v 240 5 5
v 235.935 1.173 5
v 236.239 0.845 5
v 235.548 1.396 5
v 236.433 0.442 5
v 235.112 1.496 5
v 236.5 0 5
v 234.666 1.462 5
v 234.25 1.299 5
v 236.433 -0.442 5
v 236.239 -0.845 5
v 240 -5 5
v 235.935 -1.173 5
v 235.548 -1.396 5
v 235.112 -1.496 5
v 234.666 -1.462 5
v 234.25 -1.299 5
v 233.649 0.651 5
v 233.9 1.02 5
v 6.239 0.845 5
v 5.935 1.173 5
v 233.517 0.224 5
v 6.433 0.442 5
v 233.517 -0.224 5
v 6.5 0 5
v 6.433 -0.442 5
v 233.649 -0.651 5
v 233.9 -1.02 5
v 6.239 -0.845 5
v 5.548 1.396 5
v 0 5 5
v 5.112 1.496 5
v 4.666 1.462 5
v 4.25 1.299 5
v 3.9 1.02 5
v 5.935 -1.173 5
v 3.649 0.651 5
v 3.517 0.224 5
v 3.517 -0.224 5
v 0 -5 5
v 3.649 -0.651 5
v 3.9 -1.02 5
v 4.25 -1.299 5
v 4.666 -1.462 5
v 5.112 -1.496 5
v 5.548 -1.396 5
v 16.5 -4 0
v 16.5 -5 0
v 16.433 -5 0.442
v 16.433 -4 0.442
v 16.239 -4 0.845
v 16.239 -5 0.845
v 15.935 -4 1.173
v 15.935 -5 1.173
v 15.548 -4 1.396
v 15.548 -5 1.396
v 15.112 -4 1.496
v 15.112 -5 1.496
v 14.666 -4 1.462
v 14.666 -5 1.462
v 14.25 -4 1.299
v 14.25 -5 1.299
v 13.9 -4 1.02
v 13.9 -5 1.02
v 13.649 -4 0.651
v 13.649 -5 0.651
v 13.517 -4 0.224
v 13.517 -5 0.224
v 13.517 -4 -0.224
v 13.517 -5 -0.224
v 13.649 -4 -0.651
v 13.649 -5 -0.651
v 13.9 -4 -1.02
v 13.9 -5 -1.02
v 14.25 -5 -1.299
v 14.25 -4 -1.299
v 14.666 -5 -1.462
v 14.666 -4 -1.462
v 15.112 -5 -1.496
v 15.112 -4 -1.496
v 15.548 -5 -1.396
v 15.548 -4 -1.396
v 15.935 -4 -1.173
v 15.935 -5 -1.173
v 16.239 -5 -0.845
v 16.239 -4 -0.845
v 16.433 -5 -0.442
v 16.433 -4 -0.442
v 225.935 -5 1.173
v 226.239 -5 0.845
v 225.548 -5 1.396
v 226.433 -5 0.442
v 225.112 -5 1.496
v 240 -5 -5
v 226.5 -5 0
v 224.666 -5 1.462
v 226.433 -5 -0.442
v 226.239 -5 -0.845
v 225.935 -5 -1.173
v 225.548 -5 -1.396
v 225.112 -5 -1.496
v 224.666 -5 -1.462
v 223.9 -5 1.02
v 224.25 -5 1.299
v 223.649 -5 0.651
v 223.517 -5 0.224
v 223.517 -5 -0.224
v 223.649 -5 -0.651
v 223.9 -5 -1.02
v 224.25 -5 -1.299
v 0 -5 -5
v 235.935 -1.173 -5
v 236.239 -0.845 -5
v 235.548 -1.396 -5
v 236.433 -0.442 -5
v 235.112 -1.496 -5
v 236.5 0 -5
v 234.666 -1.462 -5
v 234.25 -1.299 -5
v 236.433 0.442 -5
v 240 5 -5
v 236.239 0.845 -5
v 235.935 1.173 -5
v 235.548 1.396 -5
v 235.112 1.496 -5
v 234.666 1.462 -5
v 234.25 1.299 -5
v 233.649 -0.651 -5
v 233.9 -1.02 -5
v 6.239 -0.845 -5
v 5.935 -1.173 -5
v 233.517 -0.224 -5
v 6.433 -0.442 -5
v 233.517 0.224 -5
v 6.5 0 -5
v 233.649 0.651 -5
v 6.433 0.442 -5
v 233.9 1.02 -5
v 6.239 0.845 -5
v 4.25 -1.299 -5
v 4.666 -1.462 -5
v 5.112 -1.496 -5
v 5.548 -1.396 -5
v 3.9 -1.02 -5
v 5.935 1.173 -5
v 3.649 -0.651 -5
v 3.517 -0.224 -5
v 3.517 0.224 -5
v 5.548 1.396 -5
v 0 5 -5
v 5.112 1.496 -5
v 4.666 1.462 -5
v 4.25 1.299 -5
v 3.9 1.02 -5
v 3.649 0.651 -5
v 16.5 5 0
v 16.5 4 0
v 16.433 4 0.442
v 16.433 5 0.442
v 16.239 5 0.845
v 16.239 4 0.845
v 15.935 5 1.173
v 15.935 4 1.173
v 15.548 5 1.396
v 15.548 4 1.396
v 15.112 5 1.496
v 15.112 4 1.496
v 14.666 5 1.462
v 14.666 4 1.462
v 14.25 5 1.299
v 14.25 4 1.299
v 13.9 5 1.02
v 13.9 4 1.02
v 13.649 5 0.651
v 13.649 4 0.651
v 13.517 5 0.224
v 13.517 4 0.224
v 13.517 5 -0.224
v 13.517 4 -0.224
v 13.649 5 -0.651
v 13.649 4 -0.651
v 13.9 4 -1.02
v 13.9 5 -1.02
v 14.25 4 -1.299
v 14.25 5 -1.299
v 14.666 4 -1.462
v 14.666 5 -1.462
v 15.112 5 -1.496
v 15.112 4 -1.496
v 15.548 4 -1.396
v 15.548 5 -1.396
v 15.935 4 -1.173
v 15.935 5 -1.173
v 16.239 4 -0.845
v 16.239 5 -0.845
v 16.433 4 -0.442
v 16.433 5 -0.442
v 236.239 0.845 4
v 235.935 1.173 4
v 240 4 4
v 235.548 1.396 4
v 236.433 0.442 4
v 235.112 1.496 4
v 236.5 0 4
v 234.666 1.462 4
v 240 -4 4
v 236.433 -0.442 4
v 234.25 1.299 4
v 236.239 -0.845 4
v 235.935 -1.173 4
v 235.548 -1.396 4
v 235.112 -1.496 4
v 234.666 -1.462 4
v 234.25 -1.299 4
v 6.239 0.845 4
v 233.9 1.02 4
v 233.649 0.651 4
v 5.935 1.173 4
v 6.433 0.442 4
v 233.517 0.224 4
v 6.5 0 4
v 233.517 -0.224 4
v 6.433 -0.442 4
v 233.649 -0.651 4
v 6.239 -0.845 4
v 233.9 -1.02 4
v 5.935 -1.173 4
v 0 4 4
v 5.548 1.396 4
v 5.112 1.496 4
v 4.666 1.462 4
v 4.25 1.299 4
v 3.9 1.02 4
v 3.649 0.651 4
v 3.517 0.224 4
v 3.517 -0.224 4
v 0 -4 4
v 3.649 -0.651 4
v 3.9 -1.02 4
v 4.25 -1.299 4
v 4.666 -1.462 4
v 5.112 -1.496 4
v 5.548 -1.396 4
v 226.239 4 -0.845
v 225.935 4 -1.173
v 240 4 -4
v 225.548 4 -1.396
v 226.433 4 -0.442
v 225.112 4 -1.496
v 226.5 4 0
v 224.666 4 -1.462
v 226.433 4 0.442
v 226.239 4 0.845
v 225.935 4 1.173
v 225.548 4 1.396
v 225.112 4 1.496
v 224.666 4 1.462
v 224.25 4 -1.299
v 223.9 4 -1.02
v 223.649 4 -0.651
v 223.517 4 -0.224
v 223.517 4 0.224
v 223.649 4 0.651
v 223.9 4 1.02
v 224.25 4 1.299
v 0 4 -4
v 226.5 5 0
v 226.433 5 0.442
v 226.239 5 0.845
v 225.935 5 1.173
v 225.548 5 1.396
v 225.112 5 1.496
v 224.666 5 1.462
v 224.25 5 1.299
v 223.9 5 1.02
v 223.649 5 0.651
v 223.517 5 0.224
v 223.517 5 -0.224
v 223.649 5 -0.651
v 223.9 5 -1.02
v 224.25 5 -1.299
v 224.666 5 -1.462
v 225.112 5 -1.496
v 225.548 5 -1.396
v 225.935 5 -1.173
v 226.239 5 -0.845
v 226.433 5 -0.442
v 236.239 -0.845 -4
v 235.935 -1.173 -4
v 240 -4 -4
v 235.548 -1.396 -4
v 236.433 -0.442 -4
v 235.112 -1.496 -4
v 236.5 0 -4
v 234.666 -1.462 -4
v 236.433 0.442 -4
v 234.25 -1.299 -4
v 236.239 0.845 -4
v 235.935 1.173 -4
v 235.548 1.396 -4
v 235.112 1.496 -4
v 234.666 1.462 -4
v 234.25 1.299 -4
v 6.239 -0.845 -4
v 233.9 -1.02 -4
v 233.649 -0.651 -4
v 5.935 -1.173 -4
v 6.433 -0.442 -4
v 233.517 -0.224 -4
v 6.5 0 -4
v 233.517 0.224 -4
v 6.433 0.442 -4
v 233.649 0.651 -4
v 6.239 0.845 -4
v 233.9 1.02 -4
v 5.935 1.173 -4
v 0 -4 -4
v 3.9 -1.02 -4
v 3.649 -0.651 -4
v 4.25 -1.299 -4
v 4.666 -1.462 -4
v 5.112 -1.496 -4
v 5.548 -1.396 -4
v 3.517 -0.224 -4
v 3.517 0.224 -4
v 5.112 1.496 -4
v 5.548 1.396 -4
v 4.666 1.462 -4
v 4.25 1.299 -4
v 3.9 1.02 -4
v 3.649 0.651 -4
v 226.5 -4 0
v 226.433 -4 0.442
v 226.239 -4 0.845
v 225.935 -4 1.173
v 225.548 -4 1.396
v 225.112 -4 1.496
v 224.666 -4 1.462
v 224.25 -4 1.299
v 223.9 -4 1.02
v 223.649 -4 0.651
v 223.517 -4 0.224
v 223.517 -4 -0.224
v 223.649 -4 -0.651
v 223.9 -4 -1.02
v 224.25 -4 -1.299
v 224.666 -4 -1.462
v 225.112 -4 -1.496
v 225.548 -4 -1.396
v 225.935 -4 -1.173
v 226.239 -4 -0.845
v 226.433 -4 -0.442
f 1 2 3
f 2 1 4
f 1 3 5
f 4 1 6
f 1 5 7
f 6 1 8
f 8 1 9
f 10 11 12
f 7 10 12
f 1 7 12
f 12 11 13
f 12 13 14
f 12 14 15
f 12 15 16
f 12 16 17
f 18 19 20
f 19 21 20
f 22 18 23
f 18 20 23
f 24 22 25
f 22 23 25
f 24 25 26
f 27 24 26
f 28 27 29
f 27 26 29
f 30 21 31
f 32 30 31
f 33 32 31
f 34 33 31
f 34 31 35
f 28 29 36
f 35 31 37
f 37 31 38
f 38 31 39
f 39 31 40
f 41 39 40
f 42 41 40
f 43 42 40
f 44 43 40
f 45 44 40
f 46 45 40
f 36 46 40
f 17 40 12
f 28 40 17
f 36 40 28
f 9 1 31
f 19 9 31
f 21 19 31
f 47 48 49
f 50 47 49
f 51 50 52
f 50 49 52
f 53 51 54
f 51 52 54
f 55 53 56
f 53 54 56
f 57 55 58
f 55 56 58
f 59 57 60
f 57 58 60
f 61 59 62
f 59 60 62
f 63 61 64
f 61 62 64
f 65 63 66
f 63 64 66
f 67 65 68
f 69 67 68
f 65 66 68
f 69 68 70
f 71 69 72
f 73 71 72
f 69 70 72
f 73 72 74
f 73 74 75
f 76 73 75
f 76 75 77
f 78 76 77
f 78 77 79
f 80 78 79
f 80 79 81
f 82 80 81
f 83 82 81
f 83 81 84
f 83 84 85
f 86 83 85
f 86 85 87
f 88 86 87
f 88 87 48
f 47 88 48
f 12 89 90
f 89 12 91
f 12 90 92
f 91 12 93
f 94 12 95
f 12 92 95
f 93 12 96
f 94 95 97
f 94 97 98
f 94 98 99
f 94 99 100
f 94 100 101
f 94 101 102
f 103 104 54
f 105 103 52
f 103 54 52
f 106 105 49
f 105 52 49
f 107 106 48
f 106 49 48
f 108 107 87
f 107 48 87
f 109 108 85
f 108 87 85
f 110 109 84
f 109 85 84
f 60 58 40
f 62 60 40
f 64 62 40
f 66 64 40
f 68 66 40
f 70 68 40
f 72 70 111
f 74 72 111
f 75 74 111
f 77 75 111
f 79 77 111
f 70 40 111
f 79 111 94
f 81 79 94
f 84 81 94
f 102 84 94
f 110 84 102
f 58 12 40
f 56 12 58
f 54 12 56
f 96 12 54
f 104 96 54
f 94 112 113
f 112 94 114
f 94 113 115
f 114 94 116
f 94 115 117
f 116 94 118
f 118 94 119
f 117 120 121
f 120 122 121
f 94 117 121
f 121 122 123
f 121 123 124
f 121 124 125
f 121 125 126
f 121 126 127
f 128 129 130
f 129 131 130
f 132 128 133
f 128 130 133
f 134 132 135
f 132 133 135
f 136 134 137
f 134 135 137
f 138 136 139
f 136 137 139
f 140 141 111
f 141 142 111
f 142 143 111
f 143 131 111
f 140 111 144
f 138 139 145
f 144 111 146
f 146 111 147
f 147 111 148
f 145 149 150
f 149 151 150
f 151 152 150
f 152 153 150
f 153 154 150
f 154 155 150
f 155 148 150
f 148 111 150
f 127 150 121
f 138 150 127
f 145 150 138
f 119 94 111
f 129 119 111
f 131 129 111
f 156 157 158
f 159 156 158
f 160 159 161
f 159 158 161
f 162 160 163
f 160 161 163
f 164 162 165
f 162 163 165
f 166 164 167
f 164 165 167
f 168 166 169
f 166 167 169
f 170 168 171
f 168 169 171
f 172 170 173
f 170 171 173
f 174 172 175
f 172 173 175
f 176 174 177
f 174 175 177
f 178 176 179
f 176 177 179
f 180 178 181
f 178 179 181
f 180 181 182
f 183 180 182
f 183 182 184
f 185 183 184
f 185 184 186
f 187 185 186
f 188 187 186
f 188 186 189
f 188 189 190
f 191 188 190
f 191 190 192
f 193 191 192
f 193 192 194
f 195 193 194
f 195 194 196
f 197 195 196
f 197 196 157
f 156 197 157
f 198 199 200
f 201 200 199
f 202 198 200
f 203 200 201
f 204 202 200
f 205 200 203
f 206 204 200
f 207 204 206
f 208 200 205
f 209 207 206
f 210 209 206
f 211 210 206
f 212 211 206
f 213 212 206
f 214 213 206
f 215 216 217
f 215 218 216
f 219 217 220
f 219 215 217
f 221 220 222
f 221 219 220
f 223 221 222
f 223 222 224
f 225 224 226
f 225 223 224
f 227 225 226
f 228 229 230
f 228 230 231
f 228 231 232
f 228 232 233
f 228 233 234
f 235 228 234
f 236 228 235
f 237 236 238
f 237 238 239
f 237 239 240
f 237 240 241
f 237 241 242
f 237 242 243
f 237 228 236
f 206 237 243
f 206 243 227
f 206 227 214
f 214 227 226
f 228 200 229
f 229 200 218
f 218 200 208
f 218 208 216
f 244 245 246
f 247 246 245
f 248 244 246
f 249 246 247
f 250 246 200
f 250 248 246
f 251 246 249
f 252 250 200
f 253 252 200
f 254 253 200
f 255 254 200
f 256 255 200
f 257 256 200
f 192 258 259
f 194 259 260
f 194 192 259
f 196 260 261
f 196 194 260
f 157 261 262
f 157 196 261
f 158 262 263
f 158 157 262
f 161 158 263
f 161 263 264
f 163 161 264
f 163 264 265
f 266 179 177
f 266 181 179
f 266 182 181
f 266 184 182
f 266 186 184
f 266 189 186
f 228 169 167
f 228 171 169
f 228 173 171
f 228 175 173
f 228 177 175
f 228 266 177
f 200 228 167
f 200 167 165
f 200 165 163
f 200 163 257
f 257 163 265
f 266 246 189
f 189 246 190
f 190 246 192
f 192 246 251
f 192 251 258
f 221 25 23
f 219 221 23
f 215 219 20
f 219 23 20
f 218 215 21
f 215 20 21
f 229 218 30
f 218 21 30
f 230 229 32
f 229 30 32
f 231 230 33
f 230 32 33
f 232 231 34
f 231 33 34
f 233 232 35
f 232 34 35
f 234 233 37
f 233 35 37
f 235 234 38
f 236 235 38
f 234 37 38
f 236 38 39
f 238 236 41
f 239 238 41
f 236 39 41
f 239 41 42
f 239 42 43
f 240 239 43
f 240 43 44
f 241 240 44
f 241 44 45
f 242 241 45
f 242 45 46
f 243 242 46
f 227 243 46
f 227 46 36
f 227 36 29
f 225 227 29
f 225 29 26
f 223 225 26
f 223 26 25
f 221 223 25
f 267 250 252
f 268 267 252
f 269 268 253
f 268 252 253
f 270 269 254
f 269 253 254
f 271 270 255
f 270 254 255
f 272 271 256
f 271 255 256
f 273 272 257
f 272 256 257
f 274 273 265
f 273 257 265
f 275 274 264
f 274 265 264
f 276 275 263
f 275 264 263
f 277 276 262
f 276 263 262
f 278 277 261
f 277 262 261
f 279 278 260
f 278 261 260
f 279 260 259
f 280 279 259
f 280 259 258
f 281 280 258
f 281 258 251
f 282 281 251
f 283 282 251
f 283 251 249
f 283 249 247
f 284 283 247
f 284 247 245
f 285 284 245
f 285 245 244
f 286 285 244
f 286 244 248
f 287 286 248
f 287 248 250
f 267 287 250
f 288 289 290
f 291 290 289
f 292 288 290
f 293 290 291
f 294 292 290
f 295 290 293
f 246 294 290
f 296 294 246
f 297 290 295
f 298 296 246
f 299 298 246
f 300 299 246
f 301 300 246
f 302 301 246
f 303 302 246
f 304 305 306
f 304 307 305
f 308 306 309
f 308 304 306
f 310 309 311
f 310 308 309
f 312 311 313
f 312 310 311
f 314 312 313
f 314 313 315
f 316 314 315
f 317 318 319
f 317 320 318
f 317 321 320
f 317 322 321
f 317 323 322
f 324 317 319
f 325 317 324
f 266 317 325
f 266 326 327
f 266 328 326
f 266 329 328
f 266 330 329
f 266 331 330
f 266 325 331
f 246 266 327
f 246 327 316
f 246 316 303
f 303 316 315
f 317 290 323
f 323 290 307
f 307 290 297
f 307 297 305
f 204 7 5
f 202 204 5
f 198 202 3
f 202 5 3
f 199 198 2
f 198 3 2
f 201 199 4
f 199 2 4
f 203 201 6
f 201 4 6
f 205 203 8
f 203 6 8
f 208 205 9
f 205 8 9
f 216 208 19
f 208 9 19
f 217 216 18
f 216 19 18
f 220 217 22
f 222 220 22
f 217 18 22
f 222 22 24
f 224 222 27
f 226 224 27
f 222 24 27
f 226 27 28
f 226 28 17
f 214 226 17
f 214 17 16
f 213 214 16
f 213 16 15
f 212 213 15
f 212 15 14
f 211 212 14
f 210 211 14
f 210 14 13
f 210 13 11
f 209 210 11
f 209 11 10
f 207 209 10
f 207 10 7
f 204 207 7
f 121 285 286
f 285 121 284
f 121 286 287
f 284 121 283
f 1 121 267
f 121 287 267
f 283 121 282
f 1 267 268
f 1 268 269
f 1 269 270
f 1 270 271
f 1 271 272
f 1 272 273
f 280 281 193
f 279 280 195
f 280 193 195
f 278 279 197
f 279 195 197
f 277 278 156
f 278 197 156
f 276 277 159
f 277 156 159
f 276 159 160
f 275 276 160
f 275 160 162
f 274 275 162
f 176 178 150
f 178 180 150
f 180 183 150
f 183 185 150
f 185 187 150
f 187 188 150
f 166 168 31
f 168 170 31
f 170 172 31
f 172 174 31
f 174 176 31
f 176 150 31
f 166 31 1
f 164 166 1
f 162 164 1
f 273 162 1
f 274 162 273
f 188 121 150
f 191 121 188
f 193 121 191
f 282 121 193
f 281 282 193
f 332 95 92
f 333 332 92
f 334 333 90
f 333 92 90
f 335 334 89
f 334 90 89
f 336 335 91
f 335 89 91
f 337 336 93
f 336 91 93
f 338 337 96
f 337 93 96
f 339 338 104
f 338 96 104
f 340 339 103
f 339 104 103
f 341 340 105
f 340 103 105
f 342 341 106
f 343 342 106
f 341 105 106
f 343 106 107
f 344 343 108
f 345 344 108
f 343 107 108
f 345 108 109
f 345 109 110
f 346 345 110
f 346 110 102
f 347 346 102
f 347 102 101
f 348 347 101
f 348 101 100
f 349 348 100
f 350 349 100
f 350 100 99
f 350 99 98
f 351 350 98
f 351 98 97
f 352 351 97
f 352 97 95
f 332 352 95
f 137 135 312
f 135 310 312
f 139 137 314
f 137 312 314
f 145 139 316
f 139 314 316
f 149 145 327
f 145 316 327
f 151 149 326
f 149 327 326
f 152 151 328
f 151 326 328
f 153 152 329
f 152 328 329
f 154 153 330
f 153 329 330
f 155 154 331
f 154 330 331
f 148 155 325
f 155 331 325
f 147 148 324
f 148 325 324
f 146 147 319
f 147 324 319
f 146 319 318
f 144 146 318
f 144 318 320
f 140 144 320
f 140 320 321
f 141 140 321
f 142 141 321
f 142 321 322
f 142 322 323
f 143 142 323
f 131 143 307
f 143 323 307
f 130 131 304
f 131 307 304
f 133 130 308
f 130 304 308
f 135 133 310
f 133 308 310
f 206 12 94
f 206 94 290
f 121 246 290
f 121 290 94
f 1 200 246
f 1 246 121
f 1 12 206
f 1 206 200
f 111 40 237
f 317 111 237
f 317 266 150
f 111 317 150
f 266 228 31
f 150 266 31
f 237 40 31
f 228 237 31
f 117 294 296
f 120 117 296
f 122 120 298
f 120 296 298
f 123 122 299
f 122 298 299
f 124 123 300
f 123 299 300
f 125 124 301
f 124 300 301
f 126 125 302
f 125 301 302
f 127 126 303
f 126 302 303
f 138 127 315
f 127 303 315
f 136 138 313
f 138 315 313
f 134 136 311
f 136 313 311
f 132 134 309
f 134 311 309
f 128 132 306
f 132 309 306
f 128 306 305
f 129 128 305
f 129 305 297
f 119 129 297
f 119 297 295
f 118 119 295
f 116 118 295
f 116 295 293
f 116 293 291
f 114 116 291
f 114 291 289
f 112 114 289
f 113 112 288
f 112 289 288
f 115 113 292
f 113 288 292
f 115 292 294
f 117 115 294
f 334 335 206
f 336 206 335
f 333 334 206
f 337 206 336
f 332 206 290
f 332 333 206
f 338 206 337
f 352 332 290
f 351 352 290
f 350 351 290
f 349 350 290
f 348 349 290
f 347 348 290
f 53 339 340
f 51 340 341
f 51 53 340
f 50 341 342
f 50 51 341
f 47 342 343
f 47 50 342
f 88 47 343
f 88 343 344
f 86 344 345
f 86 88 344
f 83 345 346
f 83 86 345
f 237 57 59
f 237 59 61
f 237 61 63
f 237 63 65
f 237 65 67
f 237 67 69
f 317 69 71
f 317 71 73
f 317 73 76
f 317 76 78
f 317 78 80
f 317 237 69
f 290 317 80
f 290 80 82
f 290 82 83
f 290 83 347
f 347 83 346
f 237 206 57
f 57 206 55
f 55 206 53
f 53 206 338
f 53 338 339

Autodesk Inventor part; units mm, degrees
ref_plane "YZ Plane" through (0, 0, 0) normal (1, 0, 0) x (0, 1, 0)
ref_plane "XZ Plane" through (0, 0, 0) normal (0, 1, 0) x (-1, 0, 0)
ref_plane "XY Plane" through (0, 0, 0) normal (0, 0, 1) x (1, 0, 0)
sketch "スケッチ1" plane through (0, 0, 0) normal (1, 0, 0) x (0, 1, 0)
  line L0 (5, 5) -> (-5, 5)
  line L1 (-5, 5) -> (-5, -5)
  line L2 (-5, -5) -> (5, -5)
  line L3 (5, -5) -> (5, 5)
  line L4 (4, 4) -> (-4, 4)
  line L5 (-4, 4) -> (-4, -4)
  line L6 (-4, -4) -> (4, -4)
  line L7 (4, -4) -> (4, 4)
  point P0 (0, 0)
  dimension "d0" = 1
  dimension "d1" = 1
  dimension "d2" = 1
  dimension "d3" = 1
  dimension "d4" = 10
  dimension "d5" = 10
  dimension "d6" = 5
  dimension "d7" = 5
extrude "押し出し1" add sketch "スケッチ1" along normal blind 240
sketch "スケッチ2" plane through (0, -5, 5) normal (0, 0, 1) x (1, 0, 0)
  circle A0 centre (5, 5) radius 1.5
  circle A1 centre (235, 5) radius 1.5
  line L0 (240, 10) -> (240, 0) projected
  line L1 (0, 0) -> (240, 0) projected
  line L2 (0, 10) -> (0, 0) projected
  point P0 (0, 5)
  dimension "d10" = 5
  dimension "d11" = 3
  dimension "d12" = 5
  dimension "d13" = 5
  dimension "d14" = 5
  dimension "d15" = 3
extrude "押し出し2" cut sketch "スケッチ2" against normal blind 230
sketch "スケッチ3" plane through (0, -5, -5) normal (0, -1, 0) x (1, 0, 0)
  circle A0 centre (15, 5) radius 1.5
  line L0 (0, 10) -> (0, 0) projected
  circle A1 centre (225, 5) radius 1.5
  line L1 (240, 10) -> (240, 0) projected
  line L2 (0, 0) -> (240, 0) projected
  point P0 (0, 5)
  dimension "d18" = 3
  dimension "d19" = 15
  dimension "d20" = 3
  dimension "d21" = 15
  dimension "d22" = 5
  dimension "d23" = 5
extrude "押し出し3" cut sketch "スケッチ3" against normal blind 230
properties part number "sideparts" material "アルミニウム 6061"
